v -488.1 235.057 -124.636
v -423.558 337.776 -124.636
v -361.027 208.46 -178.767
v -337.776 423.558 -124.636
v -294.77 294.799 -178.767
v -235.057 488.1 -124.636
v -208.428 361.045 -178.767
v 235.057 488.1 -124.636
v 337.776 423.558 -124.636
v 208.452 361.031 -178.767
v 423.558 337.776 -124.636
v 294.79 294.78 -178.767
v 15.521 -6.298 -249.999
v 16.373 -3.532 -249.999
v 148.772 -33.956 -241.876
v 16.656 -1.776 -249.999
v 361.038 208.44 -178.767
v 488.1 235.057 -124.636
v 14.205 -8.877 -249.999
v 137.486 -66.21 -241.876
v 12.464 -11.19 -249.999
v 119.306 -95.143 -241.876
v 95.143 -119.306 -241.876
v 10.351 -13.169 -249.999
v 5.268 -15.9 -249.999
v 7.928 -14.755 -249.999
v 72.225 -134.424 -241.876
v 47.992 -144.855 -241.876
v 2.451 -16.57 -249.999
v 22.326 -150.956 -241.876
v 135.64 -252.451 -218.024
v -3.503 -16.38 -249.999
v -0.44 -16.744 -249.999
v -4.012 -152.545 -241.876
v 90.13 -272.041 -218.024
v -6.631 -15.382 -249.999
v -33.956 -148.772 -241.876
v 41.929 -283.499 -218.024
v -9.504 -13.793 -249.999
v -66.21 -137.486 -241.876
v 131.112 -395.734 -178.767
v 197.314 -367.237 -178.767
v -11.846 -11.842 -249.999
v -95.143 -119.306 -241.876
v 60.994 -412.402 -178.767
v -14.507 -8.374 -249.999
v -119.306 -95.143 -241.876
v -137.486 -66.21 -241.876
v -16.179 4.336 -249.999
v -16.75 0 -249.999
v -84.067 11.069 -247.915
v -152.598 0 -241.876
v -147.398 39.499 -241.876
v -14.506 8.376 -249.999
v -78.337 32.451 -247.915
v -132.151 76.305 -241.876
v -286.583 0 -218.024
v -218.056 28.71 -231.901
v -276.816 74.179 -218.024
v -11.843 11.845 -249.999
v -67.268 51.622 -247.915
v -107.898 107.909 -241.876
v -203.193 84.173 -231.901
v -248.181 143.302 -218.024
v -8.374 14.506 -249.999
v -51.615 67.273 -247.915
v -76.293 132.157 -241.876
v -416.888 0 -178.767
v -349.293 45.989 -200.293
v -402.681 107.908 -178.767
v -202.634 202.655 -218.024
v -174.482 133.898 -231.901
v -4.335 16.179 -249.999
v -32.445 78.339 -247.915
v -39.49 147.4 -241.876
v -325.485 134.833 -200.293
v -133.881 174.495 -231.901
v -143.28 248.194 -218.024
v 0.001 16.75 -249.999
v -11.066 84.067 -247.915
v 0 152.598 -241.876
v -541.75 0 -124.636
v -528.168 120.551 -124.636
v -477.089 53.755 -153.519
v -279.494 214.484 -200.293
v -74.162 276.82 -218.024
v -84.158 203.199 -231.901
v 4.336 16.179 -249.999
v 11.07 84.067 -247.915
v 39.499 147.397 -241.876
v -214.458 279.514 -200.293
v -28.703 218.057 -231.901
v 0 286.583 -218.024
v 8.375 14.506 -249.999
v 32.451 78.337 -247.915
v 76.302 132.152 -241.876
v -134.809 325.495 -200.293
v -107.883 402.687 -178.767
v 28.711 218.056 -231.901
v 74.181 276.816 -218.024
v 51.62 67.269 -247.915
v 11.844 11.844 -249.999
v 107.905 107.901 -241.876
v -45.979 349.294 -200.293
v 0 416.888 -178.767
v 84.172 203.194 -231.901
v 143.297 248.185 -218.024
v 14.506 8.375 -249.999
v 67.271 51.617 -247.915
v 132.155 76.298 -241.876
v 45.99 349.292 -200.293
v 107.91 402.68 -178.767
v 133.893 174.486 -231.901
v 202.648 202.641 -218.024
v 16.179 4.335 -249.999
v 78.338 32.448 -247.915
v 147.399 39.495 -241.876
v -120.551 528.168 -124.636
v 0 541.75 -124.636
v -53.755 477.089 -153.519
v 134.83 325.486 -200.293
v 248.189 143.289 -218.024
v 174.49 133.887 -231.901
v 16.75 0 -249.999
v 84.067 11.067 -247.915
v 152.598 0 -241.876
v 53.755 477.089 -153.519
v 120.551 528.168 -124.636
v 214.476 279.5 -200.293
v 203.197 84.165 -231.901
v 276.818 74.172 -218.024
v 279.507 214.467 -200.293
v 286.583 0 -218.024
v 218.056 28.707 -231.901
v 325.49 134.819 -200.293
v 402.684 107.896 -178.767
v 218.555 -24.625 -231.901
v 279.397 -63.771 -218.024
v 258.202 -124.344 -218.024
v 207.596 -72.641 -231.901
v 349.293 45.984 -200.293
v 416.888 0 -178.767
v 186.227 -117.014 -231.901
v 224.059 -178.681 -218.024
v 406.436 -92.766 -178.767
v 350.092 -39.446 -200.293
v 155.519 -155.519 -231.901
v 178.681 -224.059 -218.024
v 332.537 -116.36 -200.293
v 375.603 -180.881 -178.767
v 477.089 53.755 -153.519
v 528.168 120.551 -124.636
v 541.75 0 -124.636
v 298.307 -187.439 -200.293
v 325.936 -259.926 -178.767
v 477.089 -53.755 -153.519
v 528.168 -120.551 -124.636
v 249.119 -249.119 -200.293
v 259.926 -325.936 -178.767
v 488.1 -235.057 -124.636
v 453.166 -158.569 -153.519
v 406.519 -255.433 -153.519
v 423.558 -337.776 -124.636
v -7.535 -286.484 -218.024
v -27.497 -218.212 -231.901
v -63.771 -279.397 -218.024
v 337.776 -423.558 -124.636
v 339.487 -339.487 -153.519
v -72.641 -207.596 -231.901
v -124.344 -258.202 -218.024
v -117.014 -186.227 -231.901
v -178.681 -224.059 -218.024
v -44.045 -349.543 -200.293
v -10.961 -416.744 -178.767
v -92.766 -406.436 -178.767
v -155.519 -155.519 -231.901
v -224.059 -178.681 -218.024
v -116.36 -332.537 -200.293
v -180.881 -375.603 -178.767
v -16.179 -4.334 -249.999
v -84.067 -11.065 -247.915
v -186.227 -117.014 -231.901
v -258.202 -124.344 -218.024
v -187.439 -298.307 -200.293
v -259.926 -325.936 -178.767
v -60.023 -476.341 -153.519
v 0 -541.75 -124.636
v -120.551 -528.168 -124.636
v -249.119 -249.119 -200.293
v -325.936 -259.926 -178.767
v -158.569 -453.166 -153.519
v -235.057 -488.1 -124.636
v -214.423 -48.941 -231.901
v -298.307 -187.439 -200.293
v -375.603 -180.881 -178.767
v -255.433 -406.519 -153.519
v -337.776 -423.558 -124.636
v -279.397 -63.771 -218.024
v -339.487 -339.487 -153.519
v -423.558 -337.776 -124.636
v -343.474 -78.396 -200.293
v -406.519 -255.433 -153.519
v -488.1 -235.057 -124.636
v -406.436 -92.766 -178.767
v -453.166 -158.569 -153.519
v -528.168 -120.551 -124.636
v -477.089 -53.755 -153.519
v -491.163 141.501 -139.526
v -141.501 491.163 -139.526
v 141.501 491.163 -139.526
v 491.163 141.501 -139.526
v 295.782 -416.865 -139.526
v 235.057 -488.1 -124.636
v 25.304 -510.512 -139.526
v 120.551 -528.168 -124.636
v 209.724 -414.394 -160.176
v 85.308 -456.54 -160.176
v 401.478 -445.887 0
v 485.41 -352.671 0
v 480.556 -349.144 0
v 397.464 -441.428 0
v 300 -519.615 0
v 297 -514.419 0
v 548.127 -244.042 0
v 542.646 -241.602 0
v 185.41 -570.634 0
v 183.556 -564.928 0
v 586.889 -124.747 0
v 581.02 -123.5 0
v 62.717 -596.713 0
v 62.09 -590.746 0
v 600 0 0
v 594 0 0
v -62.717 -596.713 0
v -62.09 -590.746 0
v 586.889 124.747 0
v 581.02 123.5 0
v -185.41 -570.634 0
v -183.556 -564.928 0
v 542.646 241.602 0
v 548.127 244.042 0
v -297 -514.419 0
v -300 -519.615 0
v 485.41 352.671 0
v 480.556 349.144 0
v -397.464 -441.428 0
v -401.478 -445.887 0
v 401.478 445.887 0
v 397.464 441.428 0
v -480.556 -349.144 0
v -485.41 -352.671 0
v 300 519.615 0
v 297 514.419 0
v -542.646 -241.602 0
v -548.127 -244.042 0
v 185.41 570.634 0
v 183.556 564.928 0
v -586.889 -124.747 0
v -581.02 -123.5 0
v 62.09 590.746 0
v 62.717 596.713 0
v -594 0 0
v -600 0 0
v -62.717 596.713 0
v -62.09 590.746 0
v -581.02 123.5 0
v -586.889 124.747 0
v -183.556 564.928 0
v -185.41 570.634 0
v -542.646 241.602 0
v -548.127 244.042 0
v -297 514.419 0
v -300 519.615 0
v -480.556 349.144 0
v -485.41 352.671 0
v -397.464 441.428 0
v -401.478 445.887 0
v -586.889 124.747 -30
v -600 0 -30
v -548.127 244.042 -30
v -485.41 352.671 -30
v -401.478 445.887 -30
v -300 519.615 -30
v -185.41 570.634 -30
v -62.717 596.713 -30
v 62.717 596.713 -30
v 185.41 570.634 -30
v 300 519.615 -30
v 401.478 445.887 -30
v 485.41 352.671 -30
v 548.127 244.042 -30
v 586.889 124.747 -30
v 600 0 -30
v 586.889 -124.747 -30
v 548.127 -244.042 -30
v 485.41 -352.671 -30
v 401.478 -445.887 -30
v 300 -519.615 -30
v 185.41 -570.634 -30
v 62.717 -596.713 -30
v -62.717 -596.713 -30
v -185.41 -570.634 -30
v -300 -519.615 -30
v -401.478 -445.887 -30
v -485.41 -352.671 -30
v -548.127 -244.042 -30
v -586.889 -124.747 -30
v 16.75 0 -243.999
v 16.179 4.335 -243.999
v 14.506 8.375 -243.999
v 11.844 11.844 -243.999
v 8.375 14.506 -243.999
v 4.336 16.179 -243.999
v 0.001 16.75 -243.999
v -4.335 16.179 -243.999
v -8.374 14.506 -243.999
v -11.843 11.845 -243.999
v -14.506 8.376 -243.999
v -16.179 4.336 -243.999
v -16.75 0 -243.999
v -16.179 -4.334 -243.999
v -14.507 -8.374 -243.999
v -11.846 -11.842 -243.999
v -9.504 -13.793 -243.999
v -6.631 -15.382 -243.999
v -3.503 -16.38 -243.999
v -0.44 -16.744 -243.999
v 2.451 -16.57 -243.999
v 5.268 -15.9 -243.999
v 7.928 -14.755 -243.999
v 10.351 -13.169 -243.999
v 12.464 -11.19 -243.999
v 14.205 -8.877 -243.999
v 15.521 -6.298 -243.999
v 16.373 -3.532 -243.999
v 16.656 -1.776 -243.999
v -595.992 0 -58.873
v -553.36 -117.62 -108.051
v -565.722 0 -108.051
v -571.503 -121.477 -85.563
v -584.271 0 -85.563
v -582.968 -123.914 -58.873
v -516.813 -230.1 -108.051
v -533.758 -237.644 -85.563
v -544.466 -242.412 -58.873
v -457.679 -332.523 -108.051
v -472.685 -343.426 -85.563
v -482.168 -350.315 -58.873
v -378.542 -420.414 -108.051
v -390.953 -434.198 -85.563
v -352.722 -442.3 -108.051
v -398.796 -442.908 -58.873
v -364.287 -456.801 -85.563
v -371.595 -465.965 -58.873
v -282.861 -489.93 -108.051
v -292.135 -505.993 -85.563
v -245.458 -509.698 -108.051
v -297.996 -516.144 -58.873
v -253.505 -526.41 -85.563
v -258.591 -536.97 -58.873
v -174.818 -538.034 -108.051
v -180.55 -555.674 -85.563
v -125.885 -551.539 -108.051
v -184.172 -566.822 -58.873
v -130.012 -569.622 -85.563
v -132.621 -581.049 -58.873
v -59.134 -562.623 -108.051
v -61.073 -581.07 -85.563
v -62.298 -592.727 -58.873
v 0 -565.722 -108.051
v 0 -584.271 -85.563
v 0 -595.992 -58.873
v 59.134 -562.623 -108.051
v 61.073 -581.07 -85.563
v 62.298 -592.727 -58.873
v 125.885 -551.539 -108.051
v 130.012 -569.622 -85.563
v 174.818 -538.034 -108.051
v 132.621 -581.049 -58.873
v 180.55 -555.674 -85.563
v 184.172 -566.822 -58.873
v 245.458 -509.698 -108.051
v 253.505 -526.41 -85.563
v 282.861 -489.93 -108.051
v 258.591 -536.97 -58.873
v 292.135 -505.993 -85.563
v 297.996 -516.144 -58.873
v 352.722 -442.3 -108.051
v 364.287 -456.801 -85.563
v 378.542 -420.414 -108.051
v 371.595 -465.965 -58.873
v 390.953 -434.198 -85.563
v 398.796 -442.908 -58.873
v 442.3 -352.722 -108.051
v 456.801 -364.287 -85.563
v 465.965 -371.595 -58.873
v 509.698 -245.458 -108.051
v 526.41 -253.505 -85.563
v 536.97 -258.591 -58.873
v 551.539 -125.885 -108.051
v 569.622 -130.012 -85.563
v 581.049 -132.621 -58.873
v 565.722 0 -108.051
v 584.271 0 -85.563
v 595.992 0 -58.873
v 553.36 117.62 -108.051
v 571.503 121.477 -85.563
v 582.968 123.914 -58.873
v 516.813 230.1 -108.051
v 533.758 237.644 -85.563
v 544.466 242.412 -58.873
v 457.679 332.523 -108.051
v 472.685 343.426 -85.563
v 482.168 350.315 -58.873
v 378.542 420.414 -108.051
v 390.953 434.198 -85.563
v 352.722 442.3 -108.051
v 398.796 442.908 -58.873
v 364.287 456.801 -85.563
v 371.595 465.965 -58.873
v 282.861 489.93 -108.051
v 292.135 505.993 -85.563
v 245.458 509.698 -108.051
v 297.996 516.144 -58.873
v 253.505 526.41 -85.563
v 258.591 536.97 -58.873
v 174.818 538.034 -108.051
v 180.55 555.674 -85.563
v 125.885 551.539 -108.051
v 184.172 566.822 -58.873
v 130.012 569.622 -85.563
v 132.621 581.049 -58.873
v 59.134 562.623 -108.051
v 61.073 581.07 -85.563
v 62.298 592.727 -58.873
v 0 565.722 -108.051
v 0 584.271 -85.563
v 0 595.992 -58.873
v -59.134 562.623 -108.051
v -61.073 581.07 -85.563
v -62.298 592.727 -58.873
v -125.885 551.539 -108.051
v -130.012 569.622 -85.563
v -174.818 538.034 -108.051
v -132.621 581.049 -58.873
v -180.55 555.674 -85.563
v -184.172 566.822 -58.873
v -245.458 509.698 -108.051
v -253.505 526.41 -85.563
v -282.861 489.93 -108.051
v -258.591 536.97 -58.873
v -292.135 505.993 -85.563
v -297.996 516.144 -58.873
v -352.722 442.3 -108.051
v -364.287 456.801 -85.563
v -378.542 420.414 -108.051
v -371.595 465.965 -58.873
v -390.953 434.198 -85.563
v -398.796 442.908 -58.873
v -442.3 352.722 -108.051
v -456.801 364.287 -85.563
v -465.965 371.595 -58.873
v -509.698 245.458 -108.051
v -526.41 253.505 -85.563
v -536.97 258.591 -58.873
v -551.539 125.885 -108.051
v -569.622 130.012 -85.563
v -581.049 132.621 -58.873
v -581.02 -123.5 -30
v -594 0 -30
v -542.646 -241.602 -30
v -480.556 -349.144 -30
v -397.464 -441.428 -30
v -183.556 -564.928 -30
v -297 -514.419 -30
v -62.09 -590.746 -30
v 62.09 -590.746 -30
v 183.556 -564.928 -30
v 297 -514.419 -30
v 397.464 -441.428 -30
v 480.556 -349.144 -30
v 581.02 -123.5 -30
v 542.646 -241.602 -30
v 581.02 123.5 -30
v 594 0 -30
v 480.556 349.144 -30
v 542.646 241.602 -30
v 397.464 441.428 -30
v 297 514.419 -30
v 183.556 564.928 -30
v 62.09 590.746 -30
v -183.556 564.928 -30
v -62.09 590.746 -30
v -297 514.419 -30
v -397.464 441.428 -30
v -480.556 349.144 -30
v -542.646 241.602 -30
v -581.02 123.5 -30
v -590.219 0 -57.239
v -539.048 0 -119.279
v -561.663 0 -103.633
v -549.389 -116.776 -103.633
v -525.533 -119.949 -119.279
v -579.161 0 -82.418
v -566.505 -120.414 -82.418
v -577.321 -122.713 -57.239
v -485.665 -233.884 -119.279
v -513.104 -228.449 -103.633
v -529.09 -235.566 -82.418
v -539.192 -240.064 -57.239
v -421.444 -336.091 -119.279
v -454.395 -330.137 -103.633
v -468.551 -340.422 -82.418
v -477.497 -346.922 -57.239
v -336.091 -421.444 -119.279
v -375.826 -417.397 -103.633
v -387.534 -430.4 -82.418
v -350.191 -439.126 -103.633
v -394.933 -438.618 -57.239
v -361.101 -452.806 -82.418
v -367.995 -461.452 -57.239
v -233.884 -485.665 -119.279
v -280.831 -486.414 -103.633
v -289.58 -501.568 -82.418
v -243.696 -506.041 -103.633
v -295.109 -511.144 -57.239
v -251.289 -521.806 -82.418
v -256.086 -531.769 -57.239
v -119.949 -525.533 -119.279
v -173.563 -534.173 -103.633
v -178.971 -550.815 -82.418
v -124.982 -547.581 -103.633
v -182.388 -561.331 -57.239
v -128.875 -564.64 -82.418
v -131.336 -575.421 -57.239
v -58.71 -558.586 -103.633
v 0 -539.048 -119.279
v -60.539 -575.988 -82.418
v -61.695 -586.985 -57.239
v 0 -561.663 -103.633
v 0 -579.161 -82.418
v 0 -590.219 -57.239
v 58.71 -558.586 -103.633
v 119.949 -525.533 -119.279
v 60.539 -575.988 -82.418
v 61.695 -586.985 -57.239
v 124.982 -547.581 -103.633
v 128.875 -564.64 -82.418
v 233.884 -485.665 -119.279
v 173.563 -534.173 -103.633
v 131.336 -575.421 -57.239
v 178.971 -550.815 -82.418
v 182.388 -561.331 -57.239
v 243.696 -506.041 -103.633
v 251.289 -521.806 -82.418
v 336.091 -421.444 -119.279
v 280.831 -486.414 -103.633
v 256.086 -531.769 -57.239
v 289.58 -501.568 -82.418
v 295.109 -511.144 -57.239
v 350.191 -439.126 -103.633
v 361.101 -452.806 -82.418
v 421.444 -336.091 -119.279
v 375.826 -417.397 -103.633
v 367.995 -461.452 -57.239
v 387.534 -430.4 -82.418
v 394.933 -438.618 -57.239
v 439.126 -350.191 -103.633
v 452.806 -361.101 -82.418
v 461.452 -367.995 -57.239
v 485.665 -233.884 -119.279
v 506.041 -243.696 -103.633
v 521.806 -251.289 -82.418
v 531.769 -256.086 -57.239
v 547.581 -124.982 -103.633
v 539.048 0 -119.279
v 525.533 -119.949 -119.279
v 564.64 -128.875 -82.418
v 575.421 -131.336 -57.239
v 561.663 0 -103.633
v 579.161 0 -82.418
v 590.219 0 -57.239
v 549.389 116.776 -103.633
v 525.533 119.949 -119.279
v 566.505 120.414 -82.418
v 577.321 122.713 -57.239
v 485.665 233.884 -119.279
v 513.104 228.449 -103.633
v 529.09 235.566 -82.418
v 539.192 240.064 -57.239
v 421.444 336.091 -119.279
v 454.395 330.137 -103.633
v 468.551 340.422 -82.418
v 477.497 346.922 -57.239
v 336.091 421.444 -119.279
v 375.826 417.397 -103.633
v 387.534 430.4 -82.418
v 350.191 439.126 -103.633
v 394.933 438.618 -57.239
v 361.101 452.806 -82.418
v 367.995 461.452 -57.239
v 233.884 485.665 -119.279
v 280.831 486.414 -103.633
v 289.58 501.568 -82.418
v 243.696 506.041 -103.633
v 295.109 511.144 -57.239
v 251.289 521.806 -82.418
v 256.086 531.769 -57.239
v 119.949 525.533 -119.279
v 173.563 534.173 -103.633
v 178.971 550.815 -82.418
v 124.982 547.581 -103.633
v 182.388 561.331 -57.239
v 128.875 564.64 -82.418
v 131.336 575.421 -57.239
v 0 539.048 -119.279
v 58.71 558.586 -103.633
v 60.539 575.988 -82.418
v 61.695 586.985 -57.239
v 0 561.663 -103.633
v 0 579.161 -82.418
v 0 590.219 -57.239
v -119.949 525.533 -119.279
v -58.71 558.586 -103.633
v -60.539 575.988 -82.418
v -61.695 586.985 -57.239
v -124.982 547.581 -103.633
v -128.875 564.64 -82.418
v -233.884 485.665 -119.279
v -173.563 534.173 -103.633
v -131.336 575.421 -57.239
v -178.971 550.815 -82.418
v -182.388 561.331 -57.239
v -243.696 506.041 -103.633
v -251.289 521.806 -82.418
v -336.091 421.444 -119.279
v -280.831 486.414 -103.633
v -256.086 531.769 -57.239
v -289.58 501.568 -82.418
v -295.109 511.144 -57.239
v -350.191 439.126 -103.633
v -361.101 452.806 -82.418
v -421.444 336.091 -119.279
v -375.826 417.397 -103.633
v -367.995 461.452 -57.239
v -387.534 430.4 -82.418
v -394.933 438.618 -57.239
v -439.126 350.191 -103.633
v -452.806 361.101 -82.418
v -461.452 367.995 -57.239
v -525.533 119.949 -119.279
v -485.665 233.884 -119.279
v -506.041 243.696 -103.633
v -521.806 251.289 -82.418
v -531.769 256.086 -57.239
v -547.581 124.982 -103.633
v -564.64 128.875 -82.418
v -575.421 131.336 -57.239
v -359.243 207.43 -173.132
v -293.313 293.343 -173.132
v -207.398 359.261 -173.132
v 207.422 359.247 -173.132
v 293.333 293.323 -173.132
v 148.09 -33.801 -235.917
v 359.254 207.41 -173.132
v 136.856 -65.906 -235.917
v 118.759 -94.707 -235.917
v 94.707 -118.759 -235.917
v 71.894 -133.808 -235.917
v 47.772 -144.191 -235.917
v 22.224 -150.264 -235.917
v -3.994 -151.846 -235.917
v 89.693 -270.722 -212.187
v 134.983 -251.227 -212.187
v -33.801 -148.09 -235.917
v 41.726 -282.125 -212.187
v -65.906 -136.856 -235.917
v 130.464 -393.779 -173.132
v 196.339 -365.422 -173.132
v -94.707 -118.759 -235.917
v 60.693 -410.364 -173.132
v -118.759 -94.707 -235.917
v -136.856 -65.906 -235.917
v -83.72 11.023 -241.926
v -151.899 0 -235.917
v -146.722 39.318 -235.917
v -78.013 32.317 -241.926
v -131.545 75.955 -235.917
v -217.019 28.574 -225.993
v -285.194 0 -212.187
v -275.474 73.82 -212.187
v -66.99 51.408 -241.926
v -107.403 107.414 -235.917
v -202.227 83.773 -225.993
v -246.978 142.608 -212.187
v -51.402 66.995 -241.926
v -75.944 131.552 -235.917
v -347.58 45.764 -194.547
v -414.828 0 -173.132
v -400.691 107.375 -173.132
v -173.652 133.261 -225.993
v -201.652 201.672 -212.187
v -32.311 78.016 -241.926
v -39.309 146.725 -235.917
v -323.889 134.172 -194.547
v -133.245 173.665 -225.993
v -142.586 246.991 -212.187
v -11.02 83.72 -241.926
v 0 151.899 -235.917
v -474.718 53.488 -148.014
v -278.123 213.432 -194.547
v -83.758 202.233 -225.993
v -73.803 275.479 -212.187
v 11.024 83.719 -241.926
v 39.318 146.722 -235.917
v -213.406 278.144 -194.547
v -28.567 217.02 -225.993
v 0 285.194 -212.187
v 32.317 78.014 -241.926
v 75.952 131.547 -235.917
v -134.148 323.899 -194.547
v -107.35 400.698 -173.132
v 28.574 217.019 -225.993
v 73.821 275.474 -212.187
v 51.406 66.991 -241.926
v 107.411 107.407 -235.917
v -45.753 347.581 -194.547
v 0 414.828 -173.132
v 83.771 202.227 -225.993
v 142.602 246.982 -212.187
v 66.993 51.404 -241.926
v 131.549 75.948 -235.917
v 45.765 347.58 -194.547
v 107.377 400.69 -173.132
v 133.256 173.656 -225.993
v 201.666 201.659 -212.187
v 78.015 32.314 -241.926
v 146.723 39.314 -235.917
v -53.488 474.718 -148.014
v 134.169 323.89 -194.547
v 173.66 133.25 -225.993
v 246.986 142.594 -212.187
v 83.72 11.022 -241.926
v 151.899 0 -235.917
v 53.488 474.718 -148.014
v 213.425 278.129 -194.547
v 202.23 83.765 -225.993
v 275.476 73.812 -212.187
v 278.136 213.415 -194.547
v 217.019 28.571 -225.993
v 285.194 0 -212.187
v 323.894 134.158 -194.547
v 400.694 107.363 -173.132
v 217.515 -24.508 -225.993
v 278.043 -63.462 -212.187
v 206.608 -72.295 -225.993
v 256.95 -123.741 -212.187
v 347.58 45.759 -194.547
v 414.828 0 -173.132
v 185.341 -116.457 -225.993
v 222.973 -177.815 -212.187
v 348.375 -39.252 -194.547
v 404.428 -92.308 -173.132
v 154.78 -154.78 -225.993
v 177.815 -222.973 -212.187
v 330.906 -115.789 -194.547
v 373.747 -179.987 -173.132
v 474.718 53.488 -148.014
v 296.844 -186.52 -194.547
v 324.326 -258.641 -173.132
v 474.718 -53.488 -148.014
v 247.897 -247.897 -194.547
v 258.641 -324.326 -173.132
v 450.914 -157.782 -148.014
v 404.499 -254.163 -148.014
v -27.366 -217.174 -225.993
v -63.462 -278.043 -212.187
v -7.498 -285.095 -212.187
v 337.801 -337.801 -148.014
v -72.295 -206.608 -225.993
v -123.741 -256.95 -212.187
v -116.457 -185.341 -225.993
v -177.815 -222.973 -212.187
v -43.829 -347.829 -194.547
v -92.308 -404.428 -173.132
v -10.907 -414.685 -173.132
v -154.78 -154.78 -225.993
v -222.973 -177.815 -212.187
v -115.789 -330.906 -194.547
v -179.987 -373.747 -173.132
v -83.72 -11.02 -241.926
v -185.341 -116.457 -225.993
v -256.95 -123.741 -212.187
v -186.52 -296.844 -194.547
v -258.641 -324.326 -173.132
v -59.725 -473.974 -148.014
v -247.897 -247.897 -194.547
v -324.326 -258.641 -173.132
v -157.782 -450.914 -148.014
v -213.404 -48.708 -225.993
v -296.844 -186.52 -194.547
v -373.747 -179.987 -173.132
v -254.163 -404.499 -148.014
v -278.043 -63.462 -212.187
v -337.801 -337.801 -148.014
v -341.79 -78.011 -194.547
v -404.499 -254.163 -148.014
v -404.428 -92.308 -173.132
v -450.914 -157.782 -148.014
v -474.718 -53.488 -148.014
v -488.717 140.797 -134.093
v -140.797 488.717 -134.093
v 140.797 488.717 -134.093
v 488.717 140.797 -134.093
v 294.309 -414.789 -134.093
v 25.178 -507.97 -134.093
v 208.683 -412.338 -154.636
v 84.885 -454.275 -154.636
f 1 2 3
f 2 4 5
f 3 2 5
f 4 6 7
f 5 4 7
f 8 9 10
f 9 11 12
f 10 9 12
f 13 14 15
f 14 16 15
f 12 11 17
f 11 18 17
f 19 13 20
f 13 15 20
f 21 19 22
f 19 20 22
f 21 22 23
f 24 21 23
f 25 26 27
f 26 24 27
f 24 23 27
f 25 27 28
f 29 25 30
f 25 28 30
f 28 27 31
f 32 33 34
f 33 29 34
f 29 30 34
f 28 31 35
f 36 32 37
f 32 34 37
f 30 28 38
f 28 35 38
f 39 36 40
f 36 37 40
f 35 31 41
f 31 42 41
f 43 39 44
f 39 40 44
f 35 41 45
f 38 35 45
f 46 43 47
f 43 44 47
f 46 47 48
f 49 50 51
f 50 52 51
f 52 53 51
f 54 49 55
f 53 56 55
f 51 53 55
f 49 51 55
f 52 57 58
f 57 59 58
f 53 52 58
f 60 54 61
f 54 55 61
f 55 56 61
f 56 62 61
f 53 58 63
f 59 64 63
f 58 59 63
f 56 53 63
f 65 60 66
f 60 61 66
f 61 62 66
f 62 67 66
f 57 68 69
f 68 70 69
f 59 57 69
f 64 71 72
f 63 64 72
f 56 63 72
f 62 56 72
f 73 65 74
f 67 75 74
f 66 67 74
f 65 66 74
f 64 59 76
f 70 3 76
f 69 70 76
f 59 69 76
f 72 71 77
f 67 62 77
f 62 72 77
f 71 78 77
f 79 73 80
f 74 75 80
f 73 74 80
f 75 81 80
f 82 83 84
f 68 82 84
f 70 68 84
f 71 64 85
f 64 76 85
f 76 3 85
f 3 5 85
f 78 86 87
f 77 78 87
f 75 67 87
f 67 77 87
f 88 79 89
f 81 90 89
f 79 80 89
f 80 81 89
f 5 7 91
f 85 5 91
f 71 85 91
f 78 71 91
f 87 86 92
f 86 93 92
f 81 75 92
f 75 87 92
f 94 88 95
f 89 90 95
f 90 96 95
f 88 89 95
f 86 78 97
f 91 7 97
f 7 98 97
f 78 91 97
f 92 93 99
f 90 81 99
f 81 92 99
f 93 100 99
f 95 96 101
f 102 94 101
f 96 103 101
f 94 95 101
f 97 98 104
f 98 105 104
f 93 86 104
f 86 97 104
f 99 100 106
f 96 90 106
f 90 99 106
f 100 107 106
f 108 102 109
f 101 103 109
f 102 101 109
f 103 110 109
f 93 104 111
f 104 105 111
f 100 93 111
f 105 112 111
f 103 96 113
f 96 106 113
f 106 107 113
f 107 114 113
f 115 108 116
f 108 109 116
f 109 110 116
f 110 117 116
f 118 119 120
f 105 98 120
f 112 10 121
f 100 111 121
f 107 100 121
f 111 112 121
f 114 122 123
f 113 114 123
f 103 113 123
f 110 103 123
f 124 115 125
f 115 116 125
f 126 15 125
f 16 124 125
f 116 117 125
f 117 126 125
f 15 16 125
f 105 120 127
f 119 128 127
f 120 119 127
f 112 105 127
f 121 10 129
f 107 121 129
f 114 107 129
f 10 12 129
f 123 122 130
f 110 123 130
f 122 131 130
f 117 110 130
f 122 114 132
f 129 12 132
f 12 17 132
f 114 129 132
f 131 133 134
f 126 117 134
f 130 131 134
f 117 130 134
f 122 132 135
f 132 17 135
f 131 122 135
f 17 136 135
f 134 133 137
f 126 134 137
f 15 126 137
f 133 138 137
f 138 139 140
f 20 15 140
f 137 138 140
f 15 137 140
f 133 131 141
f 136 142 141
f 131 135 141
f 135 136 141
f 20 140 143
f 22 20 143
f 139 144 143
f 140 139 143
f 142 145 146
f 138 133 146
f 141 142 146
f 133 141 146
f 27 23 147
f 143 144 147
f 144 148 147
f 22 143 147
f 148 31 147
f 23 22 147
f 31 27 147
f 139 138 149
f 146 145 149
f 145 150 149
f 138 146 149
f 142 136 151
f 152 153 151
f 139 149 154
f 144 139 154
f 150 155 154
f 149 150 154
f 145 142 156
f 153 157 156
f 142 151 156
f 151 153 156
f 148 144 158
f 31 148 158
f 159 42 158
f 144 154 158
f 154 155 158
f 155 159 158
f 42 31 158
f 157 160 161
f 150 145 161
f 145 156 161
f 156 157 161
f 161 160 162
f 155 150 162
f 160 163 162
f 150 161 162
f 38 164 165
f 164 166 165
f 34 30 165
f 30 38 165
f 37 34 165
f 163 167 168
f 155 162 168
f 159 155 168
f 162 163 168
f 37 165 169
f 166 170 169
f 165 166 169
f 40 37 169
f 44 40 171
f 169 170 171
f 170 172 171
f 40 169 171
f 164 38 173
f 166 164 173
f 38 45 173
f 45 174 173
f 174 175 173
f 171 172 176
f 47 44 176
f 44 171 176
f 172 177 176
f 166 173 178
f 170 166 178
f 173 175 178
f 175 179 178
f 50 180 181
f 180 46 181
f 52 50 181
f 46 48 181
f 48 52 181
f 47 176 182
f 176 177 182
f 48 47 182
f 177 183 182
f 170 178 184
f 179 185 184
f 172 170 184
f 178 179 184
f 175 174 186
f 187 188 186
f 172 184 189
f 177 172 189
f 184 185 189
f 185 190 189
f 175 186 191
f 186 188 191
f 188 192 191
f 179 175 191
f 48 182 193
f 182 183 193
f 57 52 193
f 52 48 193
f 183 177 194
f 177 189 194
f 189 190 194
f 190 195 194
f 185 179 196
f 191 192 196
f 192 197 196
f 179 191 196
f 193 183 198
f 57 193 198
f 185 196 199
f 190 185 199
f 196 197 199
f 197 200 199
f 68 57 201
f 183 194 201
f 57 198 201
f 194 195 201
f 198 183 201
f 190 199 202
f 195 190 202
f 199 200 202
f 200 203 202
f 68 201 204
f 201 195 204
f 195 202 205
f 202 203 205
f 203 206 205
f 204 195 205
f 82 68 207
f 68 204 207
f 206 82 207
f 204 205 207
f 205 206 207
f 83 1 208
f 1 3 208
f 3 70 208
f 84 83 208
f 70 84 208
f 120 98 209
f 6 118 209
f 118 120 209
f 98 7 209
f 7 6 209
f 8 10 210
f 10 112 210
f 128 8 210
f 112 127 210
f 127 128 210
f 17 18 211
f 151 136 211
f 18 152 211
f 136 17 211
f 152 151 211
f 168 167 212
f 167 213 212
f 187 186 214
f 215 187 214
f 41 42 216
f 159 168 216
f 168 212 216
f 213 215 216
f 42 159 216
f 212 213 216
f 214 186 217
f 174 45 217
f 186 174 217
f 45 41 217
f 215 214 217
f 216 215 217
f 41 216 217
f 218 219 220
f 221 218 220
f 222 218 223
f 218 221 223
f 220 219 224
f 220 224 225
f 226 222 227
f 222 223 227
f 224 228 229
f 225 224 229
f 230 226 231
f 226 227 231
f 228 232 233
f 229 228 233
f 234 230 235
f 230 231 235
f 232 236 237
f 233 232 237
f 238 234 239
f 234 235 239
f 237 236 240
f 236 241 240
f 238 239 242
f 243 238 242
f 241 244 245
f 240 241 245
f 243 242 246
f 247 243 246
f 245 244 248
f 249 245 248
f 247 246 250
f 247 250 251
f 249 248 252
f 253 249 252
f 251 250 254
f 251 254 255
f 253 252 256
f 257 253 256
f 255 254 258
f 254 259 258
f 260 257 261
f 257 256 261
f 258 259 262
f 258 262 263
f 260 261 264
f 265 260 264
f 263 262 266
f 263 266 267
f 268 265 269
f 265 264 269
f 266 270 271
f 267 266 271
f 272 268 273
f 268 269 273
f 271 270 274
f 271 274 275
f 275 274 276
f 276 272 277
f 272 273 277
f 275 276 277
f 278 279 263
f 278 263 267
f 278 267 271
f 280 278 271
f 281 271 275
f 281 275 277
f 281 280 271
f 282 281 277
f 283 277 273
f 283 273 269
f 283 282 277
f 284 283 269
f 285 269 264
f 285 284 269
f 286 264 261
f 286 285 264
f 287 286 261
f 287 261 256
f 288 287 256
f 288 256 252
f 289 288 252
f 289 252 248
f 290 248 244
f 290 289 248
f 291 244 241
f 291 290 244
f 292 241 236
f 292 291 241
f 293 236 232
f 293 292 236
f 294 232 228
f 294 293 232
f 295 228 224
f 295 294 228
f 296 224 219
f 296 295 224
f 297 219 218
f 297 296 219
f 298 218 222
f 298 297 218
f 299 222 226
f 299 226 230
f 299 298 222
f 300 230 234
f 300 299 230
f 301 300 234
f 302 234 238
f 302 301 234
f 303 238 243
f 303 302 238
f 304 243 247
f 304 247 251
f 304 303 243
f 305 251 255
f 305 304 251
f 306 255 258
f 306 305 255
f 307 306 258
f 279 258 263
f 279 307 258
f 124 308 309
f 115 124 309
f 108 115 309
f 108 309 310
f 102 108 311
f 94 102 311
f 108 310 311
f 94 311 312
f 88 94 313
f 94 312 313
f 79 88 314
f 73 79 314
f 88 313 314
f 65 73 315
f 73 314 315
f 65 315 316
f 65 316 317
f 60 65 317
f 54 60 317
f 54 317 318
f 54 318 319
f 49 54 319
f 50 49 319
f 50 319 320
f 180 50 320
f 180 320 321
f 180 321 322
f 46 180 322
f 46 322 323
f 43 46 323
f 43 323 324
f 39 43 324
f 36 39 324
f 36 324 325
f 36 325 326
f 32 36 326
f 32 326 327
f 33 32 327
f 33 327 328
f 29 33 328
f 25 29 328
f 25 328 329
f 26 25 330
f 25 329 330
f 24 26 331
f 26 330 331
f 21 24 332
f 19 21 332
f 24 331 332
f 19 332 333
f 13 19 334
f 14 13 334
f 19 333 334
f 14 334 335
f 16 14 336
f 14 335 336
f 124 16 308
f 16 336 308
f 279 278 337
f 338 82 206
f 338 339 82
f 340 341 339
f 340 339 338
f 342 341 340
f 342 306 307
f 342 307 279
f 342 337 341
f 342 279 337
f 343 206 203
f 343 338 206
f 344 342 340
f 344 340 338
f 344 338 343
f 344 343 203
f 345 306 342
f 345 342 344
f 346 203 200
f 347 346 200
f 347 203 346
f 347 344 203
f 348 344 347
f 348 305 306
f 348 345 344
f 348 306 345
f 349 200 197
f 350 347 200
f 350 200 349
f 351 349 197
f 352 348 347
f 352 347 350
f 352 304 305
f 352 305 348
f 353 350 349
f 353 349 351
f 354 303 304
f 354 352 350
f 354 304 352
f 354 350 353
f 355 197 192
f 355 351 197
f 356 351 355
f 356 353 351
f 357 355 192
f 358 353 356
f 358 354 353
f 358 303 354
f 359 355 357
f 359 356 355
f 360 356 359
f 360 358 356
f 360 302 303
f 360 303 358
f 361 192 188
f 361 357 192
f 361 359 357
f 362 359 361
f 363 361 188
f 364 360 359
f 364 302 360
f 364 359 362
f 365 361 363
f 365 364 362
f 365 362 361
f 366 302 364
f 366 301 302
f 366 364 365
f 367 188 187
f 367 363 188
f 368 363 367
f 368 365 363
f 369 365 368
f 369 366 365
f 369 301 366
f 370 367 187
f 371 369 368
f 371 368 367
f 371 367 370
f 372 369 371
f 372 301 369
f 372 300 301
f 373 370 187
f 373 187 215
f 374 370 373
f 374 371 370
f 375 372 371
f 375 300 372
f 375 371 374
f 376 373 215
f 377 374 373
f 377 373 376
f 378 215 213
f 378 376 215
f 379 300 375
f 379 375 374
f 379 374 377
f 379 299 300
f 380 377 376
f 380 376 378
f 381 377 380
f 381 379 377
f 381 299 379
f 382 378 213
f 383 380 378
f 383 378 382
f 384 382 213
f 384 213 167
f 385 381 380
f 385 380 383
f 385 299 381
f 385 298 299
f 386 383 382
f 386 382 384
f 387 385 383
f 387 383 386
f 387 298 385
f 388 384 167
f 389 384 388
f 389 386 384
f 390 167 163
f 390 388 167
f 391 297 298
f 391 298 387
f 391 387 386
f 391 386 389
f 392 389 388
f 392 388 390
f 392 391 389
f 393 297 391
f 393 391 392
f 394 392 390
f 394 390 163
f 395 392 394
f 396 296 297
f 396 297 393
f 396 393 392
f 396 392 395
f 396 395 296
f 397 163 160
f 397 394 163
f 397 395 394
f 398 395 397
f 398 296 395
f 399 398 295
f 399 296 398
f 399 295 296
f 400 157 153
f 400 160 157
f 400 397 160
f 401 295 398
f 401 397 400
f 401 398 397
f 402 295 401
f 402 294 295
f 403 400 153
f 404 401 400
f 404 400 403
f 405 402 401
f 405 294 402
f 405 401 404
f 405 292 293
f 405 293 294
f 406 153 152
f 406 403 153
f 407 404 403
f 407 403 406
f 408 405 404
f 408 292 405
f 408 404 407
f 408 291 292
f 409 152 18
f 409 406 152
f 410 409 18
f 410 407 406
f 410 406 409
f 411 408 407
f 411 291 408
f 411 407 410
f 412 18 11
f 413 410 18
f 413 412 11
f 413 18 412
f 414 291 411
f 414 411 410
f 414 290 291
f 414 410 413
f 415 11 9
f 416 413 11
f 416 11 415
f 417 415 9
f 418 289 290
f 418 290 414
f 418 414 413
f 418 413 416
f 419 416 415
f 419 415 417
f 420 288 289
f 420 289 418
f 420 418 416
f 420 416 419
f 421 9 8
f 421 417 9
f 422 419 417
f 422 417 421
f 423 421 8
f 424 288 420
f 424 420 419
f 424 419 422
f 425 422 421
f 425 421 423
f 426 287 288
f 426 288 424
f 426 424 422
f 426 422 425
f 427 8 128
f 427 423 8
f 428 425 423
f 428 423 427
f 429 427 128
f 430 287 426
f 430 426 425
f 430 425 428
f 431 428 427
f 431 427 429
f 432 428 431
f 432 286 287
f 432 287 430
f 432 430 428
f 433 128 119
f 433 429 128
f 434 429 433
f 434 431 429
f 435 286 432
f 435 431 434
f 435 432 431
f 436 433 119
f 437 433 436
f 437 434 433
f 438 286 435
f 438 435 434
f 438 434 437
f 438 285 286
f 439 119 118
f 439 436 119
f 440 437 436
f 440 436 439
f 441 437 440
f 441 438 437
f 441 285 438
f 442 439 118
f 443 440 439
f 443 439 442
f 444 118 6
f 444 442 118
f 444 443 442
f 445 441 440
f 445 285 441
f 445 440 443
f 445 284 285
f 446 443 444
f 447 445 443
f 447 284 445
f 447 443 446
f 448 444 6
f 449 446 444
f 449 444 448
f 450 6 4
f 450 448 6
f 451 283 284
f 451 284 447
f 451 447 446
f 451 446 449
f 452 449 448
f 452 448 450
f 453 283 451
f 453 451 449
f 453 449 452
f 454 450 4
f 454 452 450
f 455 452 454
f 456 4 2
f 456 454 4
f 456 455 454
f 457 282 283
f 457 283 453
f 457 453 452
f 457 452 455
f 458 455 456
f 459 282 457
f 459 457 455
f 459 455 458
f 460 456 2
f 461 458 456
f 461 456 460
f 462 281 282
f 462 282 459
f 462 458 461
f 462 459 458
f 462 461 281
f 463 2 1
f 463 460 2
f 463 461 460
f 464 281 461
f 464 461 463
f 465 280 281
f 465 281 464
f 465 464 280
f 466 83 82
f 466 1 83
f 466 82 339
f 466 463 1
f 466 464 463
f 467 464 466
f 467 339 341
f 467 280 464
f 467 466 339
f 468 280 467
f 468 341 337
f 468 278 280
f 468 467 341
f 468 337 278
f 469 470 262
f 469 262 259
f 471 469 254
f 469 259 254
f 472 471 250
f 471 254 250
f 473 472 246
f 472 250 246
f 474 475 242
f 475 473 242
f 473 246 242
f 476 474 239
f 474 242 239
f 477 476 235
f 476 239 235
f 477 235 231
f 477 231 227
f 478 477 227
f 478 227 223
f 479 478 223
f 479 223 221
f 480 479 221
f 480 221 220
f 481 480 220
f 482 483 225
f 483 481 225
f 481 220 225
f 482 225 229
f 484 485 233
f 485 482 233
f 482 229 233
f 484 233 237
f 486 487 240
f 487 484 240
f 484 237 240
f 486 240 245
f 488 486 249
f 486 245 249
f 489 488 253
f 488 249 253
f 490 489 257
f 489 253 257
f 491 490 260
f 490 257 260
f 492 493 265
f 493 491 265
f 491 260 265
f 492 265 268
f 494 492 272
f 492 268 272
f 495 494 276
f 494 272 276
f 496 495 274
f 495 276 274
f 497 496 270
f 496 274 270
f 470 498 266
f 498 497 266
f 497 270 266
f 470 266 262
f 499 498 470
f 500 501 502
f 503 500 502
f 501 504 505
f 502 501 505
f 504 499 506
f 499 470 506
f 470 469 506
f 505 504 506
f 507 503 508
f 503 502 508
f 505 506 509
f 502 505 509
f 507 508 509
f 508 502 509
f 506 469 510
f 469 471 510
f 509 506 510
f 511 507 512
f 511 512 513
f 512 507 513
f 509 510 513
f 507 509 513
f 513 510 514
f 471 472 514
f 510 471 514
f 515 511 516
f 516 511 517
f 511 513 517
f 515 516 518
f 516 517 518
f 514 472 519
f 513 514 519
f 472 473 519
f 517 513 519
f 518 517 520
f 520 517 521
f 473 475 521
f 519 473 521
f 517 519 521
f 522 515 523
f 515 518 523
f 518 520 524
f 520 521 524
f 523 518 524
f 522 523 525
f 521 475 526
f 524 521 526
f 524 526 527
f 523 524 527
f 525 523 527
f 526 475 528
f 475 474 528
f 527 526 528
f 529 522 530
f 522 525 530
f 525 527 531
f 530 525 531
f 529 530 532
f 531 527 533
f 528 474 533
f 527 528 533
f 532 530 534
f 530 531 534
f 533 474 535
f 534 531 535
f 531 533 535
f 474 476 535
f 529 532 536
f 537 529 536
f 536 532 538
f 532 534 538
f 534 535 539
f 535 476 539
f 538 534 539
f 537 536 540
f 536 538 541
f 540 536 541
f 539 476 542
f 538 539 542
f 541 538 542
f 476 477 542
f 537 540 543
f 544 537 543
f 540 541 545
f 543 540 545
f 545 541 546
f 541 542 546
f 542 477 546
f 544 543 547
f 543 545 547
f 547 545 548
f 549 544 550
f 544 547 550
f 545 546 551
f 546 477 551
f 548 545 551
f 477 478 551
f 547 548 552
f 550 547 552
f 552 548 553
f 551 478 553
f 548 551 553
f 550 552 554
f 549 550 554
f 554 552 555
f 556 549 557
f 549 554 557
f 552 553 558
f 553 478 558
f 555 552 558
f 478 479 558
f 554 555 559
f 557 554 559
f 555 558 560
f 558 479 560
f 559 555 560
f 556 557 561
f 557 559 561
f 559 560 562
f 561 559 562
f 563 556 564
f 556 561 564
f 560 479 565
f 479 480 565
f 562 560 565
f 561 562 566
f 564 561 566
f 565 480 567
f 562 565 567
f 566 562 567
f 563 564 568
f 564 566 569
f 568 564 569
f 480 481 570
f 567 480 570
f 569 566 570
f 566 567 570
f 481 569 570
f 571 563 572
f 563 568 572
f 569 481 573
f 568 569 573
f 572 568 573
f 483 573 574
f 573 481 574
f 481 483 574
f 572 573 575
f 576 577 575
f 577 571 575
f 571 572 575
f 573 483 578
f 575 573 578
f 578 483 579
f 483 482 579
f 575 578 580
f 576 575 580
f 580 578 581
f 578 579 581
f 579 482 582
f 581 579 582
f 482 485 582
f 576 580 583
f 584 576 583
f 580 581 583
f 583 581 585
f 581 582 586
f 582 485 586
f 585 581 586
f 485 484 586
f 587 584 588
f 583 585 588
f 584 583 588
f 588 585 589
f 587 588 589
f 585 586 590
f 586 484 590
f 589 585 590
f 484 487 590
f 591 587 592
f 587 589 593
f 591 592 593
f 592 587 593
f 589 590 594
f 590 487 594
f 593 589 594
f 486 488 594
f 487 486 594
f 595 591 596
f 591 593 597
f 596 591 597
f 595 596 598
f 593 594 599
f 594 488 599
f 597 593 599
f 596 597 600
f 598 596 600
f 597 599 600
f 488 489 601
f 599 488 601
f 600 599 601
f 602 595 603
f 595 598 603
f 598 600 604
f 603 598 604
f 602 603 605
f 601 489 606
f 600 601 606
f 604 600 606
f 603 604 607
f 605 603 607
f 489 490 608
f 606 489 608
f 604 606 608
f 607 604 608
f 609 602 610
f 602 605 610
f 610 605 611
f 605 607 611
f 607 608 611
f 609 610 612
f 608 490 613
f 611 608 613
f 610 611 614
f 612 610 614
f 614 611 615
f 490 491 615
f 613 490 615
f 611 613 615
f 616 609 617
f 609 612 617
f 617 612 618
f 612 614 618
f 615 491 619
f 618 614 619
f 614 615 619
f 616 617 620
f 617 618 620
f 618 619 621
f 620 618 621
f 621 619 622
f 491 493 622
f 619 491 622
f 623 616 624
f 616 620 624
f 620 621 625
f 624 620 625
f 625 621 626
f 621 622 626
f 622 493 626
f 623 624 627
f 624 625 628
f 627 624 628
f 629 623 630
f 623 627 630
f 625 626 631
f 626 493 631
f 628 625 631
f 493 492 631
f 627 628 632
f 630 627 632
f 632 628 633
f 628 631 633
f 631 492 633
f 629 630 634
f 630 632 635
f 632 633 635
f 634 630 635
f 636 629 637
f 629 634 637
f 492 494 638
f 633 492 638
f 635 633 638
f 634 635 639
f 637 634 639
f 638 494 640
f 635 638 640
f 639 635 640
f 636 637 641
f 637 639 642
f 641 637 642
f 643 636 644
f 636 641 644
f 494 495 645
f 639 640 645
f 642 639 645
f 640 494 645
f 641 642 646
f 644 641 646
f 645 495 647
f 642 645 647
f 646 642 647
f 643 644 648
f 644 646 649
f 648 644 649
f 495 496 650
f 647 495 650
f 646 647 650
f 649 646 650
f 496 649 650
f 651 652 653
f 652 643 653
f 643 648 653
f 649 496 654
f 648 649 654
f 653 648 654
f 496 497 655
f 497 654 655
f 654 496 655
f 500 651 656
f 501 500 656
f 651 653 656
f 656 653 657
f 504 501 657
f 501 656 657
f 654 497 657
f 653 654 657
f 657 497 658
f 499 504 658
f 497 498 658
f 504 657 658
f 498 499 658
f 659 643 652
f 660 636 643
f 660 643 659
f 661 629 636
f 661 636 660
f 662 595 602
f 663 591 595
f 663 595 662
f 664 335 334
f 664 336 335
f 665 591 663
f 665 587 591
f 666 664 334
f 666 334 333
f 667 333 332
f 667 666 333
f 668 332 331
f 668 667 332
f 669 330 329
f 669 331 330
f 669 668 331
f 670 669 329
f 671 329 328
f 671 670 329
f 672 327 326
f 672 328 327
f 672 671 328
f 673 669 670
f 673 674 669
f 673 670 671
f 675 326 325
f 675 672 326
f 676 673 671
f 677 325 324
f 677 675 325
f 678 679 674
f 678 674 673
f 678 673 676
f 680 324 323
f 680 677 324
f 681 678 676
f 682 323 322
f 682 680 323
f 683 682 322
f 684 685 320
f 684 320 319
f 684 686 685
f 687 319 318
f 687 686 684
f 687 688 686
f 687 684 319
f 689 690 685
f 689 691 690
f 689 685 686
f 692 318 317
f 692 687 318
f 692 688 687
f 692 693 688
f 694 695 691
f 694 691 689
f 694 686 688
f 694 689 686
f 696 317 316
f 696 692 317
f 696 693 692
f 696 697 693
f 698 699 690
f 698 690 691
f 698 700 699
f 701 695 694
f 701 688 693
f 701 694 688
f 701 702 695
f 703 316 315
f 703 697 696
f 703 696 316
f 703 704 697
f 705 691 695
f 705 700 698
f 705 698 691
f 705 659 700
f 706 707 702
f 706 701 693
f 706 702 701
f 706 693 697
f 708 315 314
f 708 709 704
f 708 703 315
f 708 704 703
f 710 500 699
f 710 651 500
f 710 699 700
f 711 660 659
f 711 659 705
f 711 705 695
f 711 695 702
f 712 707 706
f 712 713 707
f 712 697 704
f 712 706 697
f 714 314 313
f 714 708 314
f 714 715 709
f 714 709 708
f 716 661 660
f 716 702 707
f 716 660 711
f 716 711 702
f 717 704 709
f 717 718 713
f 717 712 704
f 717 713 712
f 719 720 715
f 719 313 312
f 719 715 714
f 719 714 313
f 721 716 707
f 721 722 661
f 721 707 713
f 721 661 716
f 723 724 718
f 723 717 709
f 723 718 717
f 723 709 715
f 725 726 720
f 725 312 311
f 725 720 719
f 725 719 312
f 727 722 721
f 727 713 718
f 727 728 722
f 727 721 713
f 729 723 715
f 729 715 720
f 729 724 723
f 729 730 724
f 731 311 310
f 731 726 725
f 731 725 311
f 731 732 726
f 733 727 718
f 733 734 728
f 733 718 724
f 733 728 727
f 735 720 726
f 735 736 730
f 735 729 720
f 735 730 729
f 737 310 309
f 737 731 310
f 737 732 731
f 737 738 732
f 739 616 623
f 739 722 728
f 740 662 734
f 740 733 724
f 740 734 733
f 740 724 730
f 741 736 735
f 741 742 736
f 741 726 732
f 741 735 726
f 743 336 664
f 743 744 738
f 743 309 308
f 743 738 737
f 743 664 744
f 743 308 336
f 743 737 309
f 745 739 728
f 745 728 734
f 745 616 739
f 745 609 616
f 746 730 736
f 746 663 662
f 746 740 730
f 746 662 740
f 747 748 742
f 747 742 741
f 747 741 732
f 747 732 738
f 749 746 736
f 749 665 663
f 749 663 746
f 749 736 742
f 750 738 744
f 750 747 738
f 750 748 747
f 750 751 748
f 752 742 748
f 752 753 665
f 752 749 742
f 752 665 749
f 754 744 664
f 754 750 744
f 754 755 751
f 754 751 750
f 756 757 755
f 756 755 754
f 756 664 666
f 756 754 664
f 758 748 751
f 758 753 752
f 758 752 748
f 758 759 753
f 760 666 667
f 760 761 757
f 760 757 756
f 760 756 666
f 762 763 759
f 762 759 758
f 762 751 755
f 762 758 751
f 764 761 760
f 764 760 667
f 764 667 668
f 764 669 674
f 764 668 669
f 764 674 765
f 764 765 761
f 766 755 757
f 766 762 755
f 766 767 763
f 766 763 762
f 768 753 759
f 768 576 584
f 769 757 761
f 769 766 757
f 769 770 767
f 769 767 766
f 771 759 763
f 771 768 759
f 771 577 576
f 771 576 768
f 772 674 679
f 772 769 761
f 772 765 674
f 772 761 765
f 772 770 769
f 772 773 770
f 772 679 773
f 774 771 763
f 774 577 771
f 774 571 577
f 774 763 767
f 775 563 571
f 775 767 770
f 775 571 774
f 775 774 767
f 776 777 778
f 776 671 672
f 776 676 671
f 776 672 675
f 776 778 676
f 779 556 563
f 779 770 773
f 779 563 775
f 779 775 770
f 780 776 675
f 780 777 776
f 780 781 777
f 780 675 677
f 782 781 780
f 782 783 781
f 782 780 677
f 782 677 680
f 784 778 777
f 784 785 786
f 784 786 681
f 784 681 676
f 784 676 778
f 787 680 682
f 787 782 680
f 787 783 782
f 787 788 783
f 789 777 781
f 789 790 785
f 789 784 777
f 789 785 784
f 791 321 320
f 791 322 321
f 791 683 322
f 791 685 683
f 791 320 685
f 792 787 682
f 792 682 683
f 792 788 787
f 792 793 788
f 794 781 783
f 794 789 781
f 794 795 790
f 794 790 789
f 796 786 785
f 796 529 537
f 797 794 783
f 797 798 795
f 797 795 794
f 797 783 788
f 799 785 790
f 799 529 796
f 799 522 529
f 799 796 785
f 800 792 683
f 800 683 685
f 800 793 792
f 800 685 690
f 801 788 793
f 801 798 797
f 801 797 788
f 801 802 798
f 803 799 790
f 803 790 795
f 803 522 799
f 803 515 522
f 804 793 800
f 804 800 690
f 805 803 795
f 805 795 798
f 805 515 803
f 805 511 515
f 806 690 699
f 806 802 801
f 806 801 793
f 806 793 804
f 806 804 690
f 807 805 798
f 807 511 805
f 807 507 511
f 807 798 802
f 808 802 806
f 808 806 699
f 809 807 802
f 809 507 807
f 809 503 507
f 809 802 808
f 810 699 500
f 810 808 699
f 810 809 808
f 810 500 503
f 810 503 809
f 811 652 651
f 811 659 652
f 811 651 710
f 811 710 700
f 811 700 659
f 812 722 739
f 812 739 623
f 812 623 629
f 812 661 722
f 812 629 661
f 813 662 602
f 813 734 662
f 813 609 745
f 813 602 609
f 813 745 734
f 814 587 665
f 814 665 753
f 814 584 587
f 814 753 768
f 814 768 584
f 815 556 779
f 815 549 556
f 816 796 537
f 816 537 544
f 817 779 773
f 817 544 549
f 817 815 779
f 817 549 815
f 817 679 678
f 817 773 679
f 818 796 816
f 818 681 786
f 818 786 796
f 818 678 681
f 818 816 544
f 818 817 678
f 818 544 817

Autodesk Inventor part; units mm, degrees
ref_plane "YZ Plane" through (0, 0, 0) normal (1, 0, 0) x (0, 1, 0)
ref_plane "XZ Plane" through (0, 0, 0) normal (0, 1, 0) x (-1, 0, 0)
ref_plane "XY Plane" through (0, 0, 0) normal (0, 0, 1) x (1, 0, 0)
sketch "Sketch1" plane through (0, 0, 0) normal (0, 1, 0) x (-1, 0, 0)
  line L0 (600, 0) -> (600, -30)
  arc A0 (541.7504, -124.6356) -> (600, -30) centre (494, -30) ccw
  arc A1 (15, -250) -> (541.7504, -124.6356) centre (15, 919.3202) ccw
  line L1 (0, 0) -> (0, -191.6842)
  arc A2 (15, -244) -> (539.0476, -119.2789) centre (15, 919.3202) ccw
  arc A3 (539.0476, -119.2789) -> (594, -30) centre (494, -30) ccw
  line L2 (594, -30) -> (594, 0)
  line L3 (594, 0) -> (600, 0)
  line L4 (0, -244) -> (0, -250)
  line L5 (0, -250) -> (15, -250)
  line L6 (0, -244) -> (15, -244)
  point P0 (0, 0)
  point P1 (0, -163.7009)
  point P2 (0, -169.7009)
  dimension "d1" = 30
  dimension "d3" = 1169.3202
  dimension "d11" = 1188
  dimension "d12" = 250
  dimension "d13" = 6
  dimension "d14" = 30
  dimension "d15" = 100
revolve "Revolution1" add sketch "Sketch1" angle 360 about axis through (0, 0, 0) along (0, 0, -1)
sketch "Sketch2" plane through (0, 0, 0) normal (0, 0, 1) x (1, 0, 0)
  circle A0 centre (0, 0) radius 16.75
  dimension "d8" = 33.5
extrude "Extrusion1" cut sketch "Sketch2" against normal through all
properties part number "PRS 1604 dished head D1000_1200"
